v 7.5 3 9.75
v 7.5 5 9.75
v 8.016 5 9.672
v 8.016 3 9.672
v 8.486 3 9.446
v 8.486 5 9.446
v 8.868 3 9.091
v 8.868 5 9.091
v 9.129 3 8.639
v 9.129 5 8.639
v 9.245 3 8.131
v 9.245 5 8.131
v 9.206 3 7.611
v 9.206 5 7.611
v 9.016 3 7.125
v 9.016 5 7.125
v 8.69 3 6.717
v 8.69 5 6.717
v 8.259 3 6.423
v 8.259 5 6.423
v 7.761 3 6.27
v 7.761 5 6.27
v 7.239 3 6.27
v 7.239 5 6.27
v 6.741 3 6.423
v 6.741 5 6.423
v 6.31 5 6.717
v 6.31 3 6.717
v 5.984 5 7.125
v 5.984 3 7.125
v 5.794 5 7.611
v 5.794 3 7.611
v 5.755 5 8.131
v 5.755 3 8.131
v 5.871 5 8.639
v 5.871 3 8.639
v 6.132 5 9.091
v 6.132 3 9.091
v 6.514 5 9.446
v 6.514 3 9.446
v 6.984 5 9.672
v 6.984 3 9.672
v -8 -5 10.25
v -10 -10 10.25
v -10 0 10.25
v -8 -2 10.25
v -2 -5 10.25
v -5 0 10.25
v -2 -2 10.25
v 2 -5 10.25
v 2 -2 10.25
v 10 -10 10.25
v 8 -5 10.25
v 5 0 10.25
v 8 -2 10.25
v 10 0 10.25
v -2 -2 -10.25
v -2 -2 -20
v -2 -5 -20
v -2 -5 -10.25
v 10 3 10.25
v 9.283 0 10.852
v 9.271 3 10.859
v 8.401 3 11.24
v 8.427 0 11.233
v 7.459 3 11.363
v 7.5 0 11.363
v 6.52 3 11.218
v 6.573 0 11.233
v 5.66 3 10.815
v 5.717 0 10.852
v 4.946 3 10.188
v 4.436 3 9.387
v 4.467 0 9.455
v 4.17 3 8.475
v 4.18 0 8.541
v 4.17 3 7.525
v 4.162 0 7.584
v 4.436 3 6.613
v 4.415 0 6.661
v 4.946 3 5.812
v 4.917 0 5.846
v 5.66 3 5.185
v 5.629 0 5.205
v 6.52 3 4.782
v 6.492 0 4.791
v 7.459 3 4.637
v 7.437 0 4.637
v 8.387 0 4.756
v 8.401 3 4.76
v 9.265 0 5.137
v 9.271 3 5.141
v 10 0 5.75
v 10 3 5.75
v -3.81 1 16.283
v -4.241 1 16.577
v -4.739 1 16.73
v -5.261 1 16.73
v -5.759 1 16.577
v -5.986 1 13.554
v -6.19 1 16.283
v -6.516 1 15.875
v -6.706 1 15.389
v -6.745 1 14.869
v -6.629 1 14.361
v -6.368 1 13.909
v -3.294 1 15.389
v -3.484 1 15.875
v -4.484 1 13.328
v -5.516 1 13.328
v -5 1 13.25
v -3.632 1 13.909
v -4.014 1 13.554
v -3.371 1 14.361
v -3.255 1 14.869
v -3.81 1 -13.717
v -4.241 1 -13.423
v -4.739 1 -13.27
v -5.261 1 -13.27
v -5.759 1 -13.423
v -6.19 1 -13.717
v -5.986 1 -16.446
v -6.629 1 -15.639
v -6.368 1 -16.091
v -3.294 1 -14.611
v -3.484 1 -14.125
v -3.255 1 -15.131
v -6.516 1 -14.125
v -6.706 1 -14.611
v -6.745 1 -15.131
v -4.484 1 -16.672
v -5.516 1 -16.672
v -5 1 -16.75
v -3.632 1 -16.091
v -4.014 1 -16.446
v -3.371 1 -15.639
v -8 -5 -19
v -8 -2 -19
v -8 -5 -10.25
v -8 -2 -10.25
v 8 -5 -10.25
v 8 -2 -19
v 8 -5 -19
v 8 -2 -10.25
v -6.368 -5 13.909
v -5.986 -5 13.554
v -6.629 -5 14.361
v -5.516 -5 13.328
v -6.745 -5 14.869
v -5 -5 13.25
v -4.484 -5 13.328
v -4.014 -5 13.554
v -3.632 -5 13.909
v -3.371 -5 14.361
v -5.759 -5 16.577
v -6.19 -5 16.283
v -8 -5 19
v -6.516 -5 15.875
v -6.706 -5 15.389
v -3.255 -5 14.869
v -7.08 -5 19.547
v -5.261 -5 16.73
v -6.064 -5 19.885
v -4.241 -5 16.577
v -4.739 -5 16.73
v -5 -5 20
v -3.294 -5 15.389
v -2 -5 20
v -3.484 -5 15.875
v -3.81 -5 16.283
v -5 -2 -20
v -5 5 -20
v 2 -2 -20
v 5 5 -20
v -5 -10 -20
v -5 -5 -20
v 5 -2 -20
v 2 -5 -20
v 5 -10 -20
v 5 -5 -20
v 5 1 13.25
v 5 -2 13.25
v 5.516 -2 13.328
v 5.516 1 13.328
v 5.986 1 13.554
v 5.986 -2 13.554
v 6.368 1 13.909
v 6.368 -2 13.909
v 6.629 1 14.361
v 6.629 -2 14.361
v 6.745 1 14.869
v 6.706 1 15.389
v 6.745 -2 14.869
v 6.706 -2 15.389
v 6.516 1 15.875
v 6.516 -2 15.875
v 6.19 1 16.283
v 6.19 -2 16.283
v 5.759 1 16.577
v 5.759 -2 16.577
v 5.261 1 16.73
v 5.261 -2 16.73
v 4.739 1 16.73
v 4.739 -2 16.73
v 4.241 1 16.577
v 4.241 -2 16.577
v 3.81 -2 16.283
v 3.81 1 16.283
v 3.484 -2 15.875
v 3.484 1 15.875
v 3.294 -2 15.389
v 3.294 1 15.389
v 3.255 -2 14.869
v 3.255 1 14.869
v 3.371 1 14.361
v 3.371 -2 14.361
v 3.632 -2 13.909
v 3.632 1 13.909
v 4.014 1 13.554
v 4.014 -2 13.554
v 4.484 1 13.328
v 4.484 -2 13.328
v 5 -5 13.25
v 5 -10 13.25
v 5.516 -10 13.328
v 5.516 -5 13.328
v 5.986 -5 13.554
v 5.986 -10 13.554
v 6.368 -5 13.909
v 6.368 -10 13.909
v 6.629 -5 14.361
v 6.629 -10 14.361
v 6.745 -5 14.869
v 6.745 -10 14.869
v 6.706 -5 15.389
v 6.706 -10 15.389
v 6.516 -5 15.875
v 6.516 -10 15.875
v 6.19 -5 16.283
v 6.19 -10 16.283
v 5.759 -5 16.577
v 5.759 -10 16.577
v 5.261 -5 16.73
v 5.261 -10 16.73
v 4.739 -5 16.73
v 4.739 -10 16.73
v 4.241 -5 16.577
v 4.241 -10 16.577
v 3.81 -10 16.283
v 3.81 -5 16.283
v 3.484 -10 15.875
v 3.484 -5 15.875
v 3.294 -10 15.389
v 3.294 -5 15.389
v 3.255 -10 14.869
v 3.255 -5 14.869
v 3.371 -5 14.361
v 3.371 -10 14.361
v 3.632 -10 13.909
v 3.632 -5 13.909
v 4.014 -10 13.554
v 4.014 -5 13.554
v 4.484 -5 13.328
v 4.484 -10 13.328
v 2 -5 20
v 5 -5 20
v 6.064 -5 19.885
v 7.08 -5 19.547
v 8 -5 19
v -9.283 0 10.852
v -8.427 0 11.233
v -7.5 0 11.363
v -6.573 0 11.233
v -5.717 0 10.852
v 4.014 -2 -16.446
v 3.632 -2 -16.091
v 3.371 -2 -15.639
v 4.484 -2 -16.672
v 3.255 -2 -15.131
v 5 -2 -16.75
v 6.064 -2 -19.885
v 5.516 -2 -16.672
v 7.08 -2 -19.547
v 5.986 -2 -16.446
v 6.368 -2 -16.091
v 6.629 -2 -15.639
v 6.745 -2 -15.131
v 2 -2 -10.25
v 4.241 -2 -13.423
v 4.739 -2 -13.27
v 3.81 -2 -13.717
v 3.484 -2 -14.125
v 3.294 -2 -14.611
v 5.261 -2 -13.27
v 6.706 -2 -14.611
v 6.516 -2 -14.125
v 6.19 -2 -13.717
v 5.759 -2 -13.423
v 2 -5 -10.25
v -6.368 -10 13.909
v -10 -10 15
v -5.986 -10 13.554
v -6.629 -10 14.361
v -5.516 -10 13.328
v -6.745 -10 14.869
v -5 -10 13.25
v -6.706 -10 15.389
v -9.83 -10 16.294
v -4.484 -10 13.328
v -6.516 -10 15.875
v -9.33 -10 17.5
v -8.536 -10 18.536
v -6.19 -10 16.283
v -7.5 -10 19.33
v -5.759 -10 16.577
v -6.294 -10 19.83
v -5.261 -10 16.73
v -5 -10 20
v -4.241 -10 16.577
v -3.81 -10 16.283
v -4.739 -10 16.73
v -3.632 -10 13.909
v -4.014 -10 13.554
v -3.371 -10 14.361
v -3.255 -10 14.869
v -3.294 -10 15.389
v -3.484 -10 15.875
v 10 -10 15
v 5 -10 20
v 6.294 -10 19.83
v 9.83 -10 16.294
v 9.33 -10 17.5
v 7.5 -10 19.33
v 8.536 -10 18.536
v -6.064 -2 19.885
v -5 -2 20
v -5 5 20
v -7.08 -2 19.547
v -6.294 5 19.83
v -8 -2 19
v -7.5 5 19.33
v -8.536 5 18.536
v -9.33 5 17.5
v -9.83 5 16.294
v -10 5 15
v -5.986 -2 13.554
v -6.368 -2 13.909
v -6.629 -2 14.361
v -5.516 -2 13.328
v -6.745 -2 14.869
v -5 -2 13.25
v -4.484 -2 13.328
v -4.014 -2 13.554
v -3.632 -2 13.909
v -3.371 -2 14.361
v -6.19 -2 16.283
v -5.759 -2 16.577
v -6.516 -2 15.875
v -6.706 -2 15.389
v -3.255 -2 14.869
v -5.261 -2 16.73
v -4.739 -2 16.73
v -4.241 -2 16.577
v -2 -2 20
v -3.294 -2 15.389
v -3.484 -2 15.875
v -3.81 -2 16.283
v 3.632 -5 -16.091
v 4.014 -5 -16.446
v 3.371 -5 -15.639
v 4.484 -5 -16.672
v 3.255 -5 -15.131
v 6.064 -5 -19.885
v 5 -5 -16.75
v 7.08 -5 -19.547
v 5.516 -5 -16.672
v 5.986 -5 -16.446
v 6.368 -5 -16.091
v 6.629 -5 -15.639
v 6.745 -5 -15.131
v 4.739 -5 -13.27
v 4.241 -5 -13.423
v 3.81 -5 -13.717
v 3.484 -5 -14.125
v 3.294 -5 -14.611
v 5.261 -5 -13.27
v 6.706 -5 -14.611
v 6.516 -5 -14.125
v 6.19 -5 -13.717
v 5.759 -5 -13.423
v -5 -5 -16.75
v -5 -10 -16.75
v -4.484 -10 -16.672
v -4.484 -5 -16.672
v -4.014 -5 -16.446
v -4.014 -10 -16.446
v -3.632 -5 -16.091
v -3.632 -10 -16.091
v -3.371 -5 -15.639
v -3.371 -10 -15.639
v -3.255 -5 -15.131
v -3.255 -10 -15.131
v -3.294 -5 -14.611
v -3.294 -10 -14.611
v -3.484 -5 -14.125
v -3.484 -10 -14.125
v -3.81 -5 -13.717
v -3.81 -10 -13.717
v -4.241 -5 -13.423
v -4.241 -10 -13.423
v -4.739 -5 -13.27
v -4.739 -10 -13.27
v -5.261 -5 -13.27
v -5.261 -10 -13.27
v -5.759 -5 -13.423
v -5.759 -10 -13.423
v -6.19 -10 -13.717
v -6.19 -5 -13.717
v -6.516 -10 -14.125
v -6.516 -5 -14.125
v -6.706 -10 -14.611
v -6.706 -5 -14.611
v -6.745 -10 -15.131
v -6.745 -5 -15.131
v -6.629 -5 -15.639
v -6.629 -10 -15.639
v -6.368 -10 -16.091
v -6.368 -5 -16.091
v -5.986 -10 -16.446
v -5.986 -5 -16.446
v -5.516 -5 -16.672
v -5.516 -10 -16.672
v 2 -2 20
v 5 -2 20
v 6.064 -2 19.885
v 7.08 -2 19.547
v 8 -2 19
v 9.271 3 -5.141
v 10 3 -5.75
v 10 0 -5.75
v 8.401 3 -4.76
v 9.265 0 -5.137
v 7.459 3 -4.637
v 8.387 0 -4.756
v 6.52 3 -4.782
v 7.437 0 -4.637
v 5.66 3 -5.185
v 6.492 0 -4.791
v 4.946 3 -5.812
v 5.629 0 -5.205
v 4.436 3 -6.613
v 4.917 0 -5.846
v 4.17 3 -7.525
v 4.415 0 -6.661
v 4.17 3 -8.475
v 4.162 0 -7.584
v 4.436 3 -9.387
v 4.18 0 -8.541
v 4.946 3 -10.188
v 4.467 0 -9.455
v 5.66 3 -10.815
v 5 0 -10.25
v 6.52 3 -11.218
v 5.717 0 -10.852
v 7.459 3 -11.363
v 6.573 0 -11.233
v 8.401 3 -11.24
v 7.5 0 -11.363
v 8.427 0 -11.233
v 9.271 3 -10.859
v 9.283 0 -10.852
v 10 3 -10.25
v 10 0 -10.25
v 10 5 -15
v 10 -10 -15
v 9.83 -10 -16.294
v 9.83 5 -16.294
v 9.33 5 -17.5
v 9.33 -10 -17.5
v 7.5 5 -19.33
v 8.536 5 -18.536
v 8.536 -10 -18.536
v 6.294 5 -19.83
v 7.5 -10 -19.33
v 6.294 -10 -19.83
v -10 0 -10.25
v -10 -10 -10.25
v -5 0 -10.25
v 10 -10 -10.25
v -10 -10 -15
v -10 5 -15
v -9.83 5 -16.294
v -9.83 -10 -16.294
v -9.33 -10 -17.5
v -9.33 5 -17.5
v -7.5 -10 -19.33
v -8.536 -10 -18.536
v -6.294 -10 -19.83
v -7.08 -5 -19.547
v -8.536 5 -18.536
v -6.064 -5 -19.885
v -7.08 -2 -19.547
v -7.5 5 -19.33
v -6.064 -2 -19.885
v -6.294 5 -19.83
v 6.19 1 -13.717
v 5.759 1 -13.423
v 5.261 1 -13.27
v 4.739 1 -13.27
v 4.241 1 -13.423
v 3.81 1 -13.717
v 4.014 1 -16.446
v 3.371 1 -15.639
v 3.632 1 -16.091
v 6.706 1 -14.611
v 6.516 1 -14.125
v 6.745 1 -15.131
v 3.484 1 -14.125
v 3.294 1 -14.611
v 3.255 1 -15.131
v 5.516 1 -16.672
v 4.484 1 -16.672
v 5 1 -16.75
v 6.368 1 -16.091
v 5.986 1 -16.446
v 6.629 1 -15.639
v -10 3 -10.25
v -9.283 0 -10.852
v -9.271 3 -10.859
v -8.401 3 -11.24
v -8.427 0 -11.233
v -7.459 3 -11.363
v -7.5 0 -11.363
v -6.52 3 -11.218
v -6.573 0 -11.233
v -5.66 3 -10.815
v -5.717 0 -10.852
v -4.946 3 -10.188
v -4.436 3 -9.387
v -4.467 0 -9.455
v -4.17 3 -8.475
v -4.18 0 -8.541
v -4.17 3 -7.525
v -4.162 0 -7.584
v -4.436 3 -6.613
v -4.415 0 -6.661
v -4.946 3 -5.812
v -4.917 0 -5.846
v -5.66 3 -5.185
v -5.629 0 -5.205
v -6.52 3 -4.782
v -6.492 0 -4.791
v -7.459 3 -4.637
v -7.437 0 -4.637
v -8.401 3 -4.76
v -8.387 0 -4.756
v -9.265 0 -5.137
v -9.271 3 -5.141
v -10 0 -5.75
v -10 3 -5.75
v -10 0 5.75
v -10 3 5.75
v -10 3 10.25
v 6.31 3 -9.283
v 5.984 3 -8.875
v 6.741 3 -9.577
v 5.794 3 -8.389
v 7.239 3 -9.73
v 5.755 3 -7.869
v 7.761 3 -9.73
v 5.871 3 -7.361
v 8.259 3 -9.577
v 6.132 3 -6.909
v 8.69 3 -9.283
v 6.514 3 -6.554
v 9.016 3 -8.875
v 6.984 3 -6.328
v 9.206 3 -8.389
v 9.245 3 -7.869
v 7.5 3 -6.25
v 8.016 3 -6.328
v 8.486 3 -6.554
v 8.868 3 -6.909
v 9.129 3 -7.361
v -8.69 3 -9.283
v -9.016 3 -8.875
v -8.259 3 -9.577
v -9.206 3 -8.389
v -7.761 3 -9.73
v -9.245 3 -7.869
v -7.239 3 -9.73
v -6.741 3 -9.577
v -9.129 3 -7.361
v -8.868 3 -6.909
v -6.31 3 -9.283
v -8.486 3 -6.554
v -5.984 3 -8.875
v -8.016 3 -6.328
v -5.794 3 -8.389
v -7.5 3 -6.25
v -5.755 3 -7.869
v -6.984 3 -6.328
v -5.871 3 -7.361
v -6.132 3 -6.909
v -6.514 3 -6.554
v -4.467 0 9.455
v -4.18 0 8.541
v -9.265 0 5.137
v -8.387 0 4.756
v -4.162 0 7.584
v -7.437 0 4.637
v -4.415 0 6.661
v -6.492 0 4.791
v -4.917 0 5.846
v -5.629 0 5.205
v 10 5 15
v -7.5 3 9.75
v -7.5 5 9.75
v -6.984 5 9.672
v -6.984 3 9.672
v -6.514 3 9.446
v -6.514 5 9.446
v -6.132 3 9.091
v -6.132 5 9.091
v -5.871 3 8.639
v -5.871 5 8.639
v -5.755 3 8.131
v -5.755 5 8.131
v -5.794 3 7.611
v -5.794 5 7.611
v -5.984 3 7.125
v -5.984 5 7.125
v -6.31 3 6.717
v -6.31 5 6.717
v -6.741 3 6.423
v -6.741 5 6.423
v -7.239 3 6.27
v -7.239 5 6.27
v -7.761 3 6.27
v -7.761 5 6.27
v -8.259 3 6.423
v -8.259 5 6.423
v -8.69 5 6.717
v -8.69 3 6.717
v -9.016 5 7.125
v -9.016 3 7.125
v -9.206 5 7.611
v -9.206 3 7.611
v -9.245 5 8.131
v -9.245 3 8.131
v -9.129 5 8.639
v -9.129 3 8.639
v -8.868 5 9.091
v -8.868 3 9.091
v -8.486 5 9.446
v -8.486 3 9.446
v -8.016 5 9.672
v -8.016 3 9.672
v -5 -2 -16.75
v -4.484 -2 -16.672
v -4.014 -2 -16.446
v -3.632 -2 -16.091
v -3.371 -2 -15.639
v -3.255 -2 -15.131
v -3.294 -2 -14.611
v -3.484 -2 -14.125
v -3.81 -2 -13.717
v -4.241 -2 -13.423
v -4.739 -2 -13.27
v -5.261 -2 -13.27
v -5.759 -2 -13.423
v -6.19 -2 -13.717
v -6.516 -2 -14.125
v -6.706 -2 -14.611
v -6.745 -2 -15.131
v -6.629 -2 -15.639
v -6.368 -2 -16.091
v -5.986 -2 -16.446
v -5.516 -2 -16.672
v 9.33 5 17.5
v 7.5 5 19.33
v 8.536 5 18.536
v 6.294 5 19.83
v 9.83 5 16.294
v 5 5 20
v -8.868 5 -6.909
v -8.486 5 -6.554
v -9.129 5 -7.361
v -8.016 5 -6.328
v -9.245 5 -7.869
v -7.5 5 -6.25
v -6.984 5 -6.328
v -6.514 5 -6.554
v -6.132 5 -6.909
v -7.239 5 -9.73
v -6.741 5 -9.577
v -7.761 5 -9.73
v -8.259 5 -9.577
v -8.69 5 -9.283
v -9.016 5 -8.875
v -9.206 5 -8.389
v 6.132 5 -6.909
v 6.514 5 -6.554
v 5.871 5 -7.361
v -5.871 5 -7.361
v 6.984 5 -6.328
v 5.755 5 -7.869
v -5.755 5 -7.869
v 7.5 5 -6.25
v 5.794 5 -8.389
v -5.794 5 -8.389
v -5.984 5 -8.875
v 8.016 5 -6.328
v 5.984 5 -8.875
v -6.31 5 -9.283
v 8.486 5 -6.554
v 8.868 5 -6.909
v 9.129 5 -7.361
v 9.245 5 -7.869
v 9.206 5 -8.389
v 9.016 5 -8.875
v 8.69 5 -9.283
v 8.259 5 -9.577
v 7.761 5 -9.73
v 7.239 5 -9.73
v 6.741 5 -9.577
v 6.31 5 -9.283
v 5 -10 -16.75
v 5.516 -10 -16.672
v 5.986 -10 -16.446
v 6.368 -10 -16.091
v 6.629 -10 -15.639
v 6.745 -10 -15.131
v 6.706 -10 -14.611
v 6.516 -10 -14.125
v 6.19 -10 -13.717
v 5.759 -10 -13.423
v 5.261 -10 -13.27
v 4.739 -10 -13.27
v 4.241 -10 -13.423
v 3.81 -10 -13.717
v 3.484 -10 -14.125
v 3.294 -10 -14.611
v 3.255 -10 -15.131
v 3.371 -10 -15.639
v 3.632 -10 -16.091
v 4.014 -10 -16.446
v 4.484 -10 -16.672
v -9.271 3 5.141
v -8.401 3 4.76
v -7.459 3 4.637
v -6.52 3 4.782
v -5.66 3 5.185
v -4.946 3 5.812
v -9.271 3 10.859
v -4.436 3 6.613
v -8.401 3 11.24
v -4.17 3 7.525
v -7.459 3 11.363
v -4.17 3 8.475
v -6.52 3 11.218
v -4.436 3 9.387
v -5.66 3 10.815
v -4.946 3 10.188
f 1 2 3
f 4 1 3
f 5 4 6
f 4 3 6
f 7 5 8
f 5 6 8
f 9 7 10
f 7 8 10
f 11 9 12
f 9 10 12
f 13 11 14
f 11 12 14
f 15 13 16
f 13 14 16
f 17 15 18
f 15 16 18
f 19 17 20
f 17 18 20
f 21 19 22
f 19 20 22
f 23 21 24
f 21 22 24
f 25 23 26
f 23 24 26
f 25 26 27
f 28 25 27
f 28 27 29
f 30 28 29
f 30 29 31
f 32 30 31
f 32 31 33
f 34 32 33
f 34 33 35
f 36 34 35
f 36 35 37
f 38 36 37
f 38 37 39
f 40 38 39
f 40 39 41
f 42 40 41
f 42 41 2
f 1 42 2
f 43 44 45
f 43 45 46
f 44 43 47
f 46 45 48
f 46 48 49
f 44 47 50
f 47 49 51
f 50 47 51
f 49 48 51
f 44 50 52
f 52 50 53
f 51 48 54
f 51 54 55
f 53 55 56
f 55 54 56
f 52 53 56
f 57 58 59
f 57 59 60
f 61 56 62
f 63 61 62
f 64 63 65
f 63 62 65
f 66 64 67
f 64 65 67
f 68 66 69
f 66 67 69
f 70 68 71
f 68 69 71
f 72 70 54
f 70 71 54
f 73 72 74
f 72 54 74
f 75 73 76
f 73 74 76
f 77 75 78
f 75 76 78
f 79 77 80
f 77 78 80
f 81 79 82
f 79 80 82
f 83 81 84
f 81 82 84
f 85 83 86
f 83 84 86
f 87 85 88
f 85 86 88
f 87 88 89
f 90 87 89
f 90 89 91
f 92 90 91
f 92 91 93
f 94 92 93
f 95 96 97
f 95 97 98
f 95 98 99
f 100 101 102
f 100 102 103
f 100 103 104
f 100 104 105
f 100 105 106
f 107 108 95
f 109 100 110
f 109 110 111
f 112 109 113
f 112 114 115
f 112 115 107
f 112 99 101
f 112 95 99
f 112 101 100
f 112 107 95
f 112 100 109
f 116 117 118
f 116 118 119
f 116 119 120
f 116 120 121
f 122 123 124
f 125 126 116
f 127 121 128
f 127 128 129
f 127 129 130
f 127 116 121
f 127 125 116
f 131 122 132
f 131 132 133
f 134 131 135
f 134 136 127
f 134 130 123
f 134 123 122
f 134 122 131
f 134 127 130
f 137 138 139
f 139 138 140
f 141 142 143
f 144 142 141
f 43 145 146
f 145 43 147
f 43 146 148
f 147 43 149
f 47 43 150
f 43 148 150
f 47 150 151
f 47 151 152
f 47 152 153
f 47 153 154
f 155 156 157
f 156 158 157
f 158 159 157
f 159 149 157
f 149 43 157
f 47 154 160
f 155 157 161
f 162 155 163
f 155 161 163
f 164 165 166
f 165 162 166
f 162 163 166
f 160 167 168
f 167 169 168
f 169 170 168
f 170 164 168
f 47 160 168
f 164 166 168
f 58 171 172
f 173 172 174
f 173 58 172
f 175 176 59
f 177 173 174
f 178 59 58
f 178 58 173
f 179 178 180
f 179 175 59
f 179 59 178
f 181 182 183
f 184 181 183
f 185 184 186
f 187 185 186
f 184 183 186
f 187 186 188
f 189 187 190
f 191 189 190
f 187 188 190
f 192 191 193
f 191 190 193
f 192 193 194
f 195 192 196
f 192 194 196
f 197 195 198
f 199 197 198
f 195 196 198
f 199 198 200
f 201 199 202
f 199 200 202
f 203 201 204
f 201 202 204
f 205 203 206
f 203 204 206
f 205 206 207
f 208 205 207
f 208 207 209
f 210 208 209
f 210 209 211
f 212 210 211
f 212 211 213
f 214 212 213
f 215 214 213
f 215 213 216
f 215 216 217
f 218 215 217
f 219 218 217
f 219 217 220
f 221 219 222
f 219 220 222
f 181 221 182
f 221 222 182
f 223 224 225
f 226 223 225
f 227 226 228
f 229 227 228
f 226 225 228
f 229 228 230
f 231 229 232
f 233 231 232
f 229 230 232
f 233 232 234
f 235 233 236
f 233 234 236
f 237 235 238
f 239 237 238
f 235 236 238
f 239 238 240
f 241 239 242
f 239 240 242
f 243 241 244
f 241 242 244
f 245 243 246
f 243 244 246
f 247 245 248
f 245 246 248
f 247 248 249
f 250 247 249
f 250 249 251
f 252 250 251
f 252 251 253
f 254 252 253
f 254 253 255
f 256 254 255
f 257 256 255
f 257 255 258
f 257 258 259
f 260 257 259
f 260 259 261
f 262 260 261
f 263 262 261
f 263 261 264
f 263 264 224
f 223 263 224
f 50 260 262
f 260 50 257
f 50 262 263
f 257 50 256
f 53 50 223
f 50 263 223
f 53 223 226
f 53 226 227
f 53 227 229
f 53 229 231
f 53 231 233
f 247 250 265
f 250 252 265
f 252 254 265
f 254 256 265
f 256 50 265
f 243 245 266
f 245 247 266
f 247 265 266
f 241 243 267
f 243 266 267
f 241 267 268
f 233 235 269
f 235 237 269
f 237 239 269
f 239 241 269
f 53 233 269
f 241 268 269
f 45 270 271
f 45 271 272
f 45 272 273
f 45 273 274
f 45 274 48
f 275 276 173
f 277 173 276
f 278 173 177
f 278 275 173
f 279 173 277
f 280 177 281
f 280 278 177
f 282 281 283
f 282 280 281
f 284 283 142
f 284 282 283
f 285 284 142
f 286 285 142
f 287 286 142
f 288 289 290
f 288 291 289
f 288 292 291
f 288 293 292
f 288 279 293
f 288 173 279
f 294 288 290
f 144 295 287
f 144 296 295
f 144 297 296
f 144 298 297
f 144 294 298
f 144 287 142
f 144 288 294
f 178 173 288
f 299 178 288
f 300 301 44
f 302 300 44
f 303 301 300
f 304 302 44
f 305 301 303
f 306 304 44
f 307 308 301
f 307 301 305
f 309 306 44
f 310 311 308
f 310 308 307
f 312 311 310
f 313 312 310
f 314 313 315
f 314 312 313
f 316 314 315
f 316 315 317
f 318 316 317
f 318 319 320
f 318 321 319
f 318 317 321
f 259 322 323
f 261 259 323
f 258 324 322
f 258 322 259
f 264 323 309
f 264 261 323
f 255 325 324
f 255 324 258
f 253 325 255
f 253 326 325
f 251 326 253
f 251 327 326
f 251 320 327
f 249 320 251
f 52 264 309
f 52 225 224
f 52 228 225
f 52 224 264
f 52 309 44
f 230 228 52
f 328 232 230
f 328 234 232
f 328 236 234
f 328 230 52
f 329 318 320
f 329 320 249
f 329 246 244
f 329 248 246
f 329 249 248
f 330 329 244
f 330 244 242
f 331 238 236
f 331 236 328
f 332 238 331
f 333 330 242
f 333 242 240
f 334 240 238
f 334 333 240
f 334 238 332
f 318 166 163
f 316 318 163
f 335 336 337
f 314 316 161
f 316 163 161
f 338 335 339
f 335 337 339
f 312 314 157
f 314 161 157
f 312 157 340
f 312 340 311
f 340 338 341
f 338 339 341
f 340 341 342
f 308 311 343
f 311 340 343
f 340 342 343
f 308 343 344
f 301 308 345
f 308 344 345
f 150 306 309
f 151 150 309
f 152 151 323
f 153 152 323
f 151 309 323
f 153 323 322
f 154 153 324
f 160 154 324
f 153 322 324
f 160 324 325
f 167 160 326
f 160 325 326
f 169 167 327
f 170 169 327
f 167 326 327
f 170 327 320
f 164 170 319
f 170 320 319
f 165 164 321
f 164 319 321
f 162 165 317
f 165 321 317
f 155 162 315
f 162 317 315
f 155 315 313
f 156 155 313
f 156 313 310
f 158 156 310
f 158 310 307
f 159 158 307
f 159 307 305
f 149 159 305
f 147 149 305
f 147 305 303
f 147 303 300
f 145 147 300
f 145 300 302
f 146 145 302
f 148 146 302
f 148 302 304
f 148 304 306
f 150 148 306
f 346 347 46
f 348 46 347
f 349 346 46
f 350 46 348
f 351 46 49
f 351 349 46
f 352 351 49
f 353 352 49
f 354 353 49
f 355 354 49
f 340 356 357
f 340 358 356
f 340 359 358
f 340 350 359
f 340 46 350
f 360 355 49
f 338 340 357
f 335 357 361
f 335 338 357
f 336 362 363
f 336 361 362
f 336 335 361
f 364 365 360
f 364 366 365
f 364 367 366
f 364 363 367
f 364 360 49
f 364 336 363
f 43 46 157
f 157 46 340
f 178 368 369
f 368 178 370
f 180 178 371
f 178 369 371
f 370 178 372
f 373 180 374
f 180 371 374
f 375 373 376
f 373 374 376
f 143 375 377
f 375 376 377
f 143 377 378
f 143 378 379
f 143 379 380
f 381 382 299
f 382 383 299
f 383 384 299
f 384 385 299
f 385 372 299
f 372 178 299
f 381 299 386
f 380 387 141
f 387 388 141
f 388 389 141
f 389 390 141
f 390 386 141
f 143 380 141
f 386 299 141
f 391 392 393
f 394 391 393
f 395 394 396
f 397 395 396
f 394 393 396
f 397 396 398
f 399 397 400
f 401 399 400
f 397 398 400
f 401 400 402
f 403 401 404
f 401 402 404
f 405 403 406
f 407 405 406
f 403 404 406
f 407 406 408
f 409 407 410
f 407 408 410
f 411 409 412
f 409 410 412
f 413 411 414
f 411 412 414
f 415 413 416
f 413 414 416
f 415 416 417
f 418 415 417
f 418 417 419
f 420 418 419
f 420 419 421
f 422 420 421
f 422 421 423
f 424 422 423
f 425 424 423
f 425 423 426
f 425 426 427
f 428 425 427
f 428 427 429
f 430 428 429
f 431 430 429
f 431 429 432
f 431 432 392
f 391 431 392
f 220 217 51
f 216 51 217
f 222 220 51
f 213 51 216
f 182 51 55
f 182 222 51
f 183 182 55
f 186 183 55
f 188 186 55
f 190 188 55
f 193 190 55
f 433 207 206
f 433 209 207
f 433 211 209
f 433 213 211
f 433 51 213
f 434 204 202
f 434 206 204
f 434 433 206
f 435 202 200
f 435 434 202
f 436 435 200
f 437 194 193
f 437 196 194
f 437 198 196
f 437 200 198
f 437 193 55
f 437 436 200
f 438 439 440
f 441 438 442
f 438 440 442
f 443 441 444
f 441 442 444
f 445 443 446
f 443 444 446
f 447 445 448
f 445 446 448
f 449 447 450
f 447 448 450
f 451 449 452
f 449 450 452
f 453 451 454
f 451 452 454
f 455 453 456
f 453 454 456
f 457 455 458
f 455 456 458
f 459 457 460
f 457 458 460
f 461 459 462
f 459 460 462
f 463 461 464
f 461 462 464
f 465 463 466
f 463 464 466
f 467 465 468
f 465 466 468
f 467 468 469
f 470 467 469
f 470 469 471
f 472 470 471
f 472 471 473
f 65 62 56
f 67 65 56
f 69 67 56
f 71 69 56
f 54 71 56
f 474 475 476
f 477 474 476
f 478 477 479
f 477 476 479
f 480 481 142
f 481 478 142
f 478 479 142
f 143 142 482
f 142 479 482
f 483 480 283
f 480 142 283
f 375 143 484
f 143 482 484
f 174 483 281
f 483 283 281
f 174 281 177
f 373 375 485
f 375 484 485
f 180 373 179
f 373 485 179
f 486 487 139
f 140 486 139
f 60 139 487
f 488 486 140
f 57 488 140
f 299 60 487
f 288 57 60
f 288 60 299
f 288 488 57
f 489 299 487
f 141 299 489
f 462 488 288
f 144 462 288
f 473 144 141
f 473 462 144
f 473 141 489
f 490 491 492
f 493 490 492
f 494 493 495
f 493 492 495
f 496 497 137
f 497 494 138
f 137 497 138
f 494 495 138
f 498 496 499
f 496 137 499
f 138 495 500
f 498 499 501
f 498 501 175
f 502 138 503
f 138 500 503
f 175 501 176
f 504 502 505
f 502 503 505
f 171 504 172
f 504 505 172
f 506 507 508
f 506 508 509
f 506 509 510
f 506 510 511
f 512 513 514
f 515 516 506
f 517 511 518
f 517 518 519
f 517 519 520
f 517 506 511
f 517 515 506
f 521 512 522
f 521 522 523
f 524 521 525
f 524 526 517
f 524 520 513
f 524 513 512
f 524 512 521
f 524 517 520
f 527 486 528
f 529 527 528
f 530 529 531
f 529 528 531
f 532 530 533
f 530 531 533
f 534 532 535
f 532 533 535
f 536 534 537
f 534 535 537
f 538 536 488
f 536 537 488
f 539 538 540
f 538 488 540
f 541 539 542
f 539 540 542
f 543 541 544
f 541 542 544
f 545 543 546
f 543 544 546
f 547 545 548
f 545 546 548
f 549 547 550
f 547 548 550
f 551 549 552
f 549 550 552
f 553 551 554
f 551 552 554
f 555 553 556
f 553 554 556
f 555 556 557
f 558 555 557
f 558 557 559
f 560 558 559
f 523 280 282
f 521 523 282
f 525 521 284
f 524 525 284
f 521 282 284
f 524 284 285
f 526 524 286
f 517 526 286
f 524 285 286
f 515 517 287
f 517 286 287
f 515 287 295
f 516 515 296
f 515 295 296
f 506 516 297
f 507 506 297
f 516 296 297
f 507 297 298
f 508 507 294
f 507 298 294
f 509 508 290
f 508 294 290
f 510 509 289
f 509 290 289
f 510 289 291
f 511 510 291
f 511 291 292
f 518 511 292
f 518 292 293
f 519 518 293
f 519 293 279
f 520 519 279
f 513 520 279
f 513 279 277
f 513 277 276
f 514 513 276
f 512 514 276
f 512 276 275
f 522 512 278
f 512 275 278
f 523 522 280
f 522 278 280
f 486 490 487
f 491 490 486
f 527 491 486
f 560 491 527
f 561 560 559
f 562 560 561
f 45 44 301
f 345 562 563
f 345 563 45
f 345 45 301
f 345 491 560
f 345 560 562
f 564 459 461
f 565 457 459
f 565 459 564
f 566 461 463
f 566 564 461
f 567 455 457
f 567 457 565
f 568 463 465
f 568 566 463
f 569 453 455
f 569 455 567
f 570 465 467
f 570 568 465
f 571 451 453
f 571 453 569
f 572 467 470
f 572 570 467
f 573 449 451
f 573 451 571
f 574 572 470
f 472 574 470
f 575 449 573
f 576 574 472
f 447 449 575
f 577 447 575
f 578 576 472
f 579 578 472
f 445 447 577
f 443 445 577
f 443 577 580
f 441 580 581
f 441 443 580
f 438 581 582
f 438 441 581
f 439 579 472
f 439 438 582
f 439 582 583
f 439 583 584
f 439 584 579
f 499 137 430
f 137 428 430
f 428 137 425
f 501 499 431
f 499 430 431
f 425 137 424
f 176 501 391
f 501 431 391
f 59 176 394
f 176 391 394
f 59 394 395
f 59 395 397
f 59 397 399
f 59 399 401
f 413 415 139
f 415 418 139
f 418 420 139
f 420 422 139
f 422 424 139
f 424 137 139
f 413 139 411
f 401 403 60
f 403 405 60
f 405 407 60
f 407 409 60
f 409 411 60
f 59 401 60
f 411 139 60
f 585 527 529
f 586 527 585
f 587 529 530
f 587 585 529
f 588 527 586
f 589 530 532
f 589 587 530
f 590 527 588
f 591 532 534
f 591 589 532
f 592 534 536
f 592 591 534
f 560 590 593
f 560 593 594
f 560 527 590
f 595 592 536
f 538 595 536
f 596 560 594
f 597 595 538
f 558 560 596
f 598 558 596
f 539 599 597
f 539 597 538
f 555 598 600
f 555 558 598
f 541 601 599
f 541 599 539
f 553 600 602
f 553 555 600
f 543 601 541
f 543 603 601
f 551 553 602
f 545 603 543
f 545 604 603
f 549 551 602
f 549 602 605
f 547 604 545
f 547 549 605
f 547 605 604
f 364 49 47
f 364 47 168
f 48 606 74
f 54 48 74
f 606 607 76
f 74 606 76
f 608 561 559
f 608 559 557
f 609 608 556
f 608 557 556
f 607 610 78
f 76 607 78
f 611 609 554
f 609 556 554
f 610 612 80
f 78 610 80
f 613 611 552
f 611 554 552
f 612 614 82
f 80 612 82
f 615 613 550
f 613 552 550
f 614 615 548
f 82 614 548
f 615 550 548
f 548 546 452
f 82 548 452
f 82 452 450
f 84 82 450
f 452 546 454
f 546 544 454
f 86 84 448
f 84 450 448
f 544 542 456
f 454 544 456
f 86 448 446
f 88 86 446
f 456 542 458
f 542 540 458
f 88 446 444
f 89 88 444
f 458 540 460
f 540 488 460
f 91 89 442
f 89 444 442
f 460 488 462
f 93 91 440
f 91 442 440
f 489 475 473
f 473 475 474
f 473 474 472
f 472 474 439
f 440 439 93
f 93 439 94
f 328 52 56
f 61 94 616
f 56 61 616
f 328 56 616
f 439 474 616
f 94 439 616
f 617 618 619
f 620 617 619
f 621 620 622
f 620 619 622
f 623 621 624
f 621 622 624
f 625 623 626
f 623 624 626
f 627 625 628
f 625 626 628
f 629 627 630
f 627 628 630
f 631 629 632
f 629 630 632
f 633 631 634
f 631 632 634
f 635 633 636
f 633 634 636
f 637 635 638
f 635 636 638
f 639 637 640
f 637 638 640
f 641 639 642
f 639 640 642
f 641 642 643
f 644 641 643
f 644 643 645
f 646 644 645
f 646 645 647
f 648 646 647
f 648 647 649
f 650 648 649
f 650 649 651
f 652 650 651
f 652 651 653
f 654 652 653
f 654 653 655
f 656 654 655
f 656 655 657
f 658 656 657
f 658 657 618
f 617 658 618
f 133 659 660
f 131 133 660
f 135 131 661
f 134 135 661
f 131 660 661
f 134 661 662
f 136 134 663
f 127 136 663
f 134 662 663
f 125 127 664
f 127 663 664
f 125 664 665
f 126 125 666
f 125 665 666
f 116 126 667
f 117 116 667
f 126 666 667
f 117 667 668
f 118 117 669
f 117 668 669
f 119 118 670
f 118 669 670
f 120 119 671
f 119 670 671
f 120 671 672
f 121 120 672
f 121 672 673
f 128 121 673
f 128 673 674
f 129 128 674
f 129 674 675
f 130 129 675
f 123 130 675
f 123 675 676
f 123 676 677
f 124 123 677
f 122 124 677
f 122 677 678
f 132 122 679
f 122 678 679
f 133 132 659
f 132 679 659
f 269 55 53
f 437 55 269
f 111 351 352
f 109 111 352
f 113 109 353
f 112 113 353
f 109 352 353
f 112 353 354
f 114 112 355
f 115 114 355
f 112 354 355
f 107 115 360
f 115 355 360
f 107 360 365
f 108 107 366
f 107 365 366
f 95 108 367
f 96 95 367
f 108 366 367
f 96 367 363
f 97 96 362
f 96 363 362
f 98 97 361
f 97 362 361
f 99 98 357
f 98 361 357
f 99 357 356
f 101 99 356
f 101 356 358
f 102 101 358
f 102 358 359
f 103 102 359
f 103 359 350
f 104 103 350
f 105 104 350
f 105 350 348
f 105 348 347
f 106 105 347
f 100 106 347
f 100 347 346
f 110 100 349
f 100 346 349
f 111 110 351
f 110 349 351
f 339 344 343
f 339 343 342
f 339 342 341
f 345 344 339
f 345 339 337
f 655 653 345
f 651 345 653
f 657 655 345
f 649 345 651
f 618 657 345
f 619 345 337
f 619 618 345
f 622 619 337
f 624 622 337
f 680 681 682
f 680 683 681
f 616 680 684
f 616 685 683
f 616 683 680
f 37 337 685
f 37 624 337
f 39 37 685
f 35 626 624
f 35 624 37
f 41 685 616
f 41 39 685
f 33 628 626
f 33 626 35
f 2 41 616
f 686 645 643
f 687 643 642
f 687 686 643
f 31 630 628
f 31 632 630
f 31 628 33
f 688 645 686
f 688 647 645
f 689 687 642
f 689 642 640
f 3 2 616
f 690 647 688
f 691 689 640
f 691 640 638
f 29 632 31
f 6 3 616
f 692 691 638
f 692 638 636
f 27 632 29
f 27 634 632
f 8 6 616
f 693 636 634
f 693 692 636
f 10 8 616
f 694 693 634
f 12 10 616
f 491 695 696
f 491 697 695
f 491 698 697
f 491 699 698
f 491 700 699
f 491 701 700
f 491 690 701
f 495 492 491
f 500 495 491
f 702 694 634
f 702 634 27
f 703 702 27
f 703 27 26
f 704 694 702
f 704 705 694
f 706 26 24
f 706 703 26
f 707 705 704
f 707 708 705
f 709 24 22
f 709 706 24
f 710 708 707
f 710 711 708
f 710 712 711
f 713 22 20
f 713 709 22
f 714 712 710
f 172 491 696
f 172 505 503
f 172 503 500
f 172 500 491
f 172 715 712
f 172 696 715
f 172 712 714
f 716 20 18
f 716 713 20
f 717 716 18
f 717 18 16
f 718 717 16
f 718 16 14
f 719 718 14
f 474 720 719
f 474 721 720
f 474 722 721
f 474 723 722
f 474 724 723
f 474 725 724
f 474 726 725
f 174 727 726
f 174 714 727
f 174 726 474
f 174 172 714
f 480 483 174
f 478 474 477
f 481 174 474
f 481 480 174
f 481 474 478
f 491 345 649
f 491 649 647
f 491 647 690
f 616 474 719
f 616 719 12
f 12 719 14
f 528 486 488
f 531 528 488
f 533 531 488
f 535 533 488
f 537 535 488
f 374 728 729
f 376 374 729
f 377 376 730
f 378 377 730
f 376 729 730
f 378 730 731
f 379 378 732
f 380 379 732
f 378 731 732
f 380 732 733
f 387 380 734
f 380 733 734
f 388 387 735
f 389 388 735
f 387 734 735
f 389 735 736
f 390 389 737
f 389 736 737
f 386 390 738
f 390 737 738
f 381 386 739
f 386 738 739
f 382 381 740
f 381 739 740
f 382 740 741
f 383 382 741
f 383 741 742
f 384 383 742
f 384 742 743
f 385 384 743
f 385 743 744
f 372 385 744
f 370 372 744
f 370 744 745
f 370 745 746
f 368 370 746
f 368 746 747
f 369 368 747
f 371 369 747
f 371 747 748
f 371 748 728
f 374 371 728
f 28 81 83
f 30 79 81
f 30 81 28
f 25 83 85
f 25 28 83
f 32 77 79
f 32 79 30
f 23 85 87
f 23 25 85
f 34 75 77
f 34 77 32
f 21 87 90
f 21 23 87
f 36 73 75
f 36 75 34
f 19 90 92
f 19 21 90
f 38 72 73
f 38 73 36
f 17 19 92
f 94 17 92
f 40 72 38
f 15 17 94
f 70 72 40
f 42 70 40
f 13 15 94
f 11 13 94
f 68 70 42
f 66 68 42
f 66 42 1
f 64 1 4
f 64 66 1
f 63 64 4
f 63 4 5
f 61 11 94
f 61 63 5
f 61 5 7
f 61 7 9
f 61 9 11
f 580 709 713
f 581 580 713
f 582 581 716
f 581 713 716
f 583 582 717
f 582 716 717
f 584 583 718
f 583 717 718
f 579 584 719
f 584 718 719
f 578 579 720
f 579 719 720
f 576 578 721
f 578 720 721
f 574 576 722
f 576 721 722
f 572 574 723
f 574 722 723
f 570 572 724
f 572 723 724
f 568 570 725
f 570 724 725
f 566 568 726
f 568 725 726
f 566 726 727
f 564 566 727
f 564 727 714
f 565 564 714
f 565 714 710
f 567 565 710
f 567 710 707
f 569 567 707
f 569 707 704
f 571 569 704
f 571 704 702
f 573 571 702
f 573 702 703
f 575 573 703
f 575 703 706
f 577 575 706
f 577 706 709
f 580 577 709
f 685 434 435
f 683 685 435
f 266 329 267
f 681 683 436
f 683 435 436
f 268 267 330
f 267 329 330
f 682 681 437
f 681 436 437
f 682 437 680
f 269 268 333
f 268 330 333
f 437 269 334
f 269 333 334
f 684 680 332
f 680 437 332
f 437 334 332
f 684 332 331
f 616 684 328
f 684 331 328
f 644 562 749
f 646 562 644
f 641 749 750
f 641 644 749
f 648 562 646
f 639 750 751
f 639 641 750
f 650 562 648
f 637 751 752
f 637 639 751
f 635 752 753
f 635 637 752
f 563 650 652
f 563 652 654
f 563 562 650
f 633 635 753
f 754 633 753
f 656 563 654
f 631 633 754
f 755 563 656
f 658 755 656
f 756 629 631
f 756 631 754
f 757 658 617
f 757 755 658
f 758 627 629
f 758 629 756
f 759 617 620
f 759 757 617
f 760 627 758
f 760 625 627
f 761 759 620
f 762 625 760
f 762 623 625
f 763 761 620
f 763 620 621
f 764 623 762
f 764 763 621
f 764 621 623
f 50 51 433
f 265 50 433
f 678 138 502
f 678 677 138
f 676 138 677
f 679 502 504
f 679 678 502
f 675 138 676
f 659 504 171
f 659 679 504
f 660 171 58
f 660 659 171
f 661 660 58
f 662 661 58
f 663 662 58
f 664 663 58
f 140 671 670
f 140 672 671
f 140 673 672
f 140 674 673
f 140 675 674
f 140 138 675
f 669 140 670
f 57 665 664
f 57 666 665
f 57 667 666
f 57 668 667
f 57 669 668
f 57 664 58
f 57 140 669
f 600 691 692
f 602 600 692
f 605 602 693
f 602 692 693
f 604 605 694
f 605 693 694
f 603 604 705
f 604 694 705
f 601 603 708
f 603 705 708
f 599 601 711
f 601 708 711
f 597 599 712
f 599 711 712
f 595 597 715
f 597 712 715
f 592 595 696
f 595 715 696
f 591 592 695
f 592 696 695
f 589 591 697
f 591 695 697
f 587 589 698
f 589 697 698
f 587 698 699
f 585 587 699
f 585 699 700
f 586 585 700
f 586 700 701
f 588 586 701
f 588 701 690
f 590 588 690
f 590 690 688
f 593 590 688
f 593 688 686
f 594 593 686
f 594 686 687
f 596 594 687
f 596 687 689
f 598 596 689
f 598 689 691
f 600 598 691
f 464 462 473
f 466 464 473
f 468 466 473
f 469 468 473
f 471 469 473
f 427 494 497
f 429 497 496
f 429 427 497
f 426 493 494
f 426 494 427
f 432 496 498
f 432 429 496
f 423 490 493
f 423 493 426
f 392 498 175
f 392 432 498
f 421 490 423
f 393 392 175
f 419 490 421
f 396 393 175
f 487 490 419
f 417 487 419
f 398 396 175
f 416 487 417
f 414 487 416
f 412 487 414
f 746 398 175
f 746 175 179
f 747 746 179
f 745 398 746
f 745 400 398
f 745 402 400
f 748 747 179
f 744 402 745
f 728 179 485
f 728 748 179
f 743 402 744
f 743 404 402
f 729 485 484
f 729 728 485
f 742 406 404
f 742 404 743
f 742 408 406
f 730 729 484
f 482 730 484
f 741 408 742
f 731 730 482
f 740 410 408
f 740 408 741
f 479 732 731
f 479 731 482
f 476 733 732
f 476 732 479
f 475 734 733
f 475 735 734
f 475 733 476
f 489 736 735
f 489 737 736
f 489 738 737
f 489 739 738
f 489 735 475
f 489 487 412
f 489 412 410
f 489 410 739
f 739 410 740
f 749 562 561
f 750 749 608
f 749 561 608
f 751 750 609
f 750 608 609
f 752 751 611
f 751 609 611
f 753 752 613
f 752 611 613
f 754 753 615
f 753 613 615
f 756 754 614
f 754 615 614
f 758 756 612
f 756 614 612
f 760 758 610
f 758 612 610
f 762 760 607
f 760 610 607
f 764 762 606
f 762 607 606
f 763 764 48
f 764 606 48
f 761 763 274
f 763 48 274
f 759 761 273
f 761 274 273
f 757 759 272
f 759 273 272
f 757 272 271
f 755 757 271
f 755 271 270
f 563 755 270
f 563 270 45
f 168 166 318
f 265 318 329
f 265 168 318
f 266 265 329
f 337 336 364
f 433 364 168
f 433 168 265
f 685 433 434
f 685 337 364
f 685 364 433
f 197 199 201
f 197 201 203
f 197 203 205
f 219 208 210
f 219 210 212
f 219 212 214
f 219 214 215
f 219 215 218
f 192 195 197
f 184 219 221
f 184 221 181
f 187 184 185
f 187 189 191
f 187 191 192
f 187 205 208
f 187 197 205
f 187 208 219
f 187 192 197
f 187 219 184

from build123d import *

# Parameters (mm, degrees)
SKETCH1_W           = 20
SKETCH1_H           = 40
BOSS_EXTRUDE1_DEPTH = 5
SKETCH2_W           = 20
SKETCH2_H           = 9.75
BOSS_EXTRUDE2_DEPTH = 10
SKETCH3_R           = 1.75
CUT_EXTRUDE1_DEPTH  = 5
SKETCH4_R           = 3.363406012
CUT_EXTRUDE2_DEPTH  = 3
SKETCH5_R           = 1.75
CUT_EXTRUDE3_DEPTH  = 8
SKETCH6_W           = 6
SKETCH6_H           = 10
CUT_EXTRUDE4_DEPTH  = 3
SKETCH7_R           = 1.75
CUT_EXTRUDE5_DEPTH  = 3
FILLET1_R           = 5


with BuildPart() as part:
    # Sketch1 → Boss-Extrude1 (new body)
    with BuildSketch(Plane(origin=(0, 0, 0), x_dir=(1, 0, 0), z_dir=(0, 1, 0))):
        Rectangle(SKETCH1_W, SKETCH1_H)
    extrude(amount=BOSS_EXTRUDE1_DEPTH)

    # Sketch2 → Boss-Extrude2 (add)
    with BuildSketch(Plane.XZ):
        with Locations((0, 15.125)):
            Rectangle(SKETCH2_W, SKETCH2_H)
        with Locations((0, -15.125)):
            Rectangle(SKETCH2_W, SKETCH2_H)
    extrude(amount=BOSS_EXTRUDE2_DEPTH)

    # Sketch3 → Cut-Extrude1 (cut)
    with BuildSketch(Plane(origin=(0, 5, 0), x_dir=(1, 0, 0), z_dir=(0, 1, 0))):
        with Locations(Location((-7.5, -8, 0), (0, 0, 270))):
            Circle(SKETCH3_R)
        with Locations(Location((-7.5, 8, 0), (0, 0, 270))):
            Circle(SKETCH3_R)
        with Locations(Location((7.5, -8, 0), (0, 0, 270))):
            Circle(SKETCH3_R)
        with Locations(Location((7.5, 8, 0), (0, 0, 270))):
            Circle(SKETCH3_R)
    extrude(amount=-CUT_EXTRUDE1_DEPTH, mode=Mode.SUBTRACT)

    # Sketch4 → Cut-Extrude2 (cut)
    with BuildSketch(Plane.XZ):
        with Locations((7.5, 8)):
            Circle(SKETCH4_R)
        with Locations((-7.5, 8)):
            Circle(SKETCH4_R)
        with Locations((-7.5, -8)):
            Circle(SKETCH4_R)
        with Locations((7.5, -8)):
            Circle(SKETCH4_R)
    extrude(amount=-CUT_EXTRUDE2_DEPTH, mode=Mode.SUBTRACT)

    # Sketch5 → Cut-Extrude3 (cut)
    with BuildSketch(Plane.XZ.offset(10)):
        with Locations(Location((-5, -15, 0), (0, 0, 270))):
            Circle(SKETCH5_R)
        with Locations(Location((5, -15, 0), (0, 0, 270))):
            Circle(SKETCH5_R)
        with Locations(Location((-5, 15, 0), (0, 0, 270))):
            Circle(SKETCH5_R)
        with Locations(Location((5, 15, 0), (0, 0, 270))):
            Circle(SKETCH5_R)
    extrude(amount=-CUT_EXTRUDE3_DEPTH, mode=Mode.SUBTRACT)

    # Sketch6 → Cut-Extrude4 (cut)
    with BuildSketch(Plane.XZ.offset(2)):
        with Locations((-5, -15)):
            Rectangle(SKETCH6_W, SKETCH6_H)
        with Locations((5, -15)):
            Rectangle(SKETCH6_W, SKETCH6_H)
        with Locations((5, 15)):
            Rectangle(SKETCH6_W, SKETCH6_H)
        with Locations((-5, 15)):
            Rectangle(SKETCH6_W, SKETCH6_H)
    extrude(amount=CUT_EXTRUDE4_DEPTH, mode=Mode.SUBTRACT)

    # Sketch7 → Cut-Extrude5 (cut)
    with BuildSketch(Plane.XZ.offset(2)):
        with Locations(Location((-5, -15, 0), (0, 0, 270))):
            Circle(SKETCH7_R)
        with Locations(Location((5, -15, 0), (0, 0, 270))):
            Circle(SKETCH7_R)
        with Locations(Location((5, 15, 0), (0, 0, 270))):
            Circle(SKETCH7_R)
        with Locations(Location((-5, 15, 0), (0, 0, 270))):
            Circle(SKETCH7_R)
    extrude(amount=-CUT_EXTRUDE5_DEPTH, mode=Mode.SUBTRACT)

    # Fillet1
    # the kernel refuses this fillet: 5 mm, written as the material it takes off along each edge
    with BuildSketch(Plane(origin=(-10, 17.5, -20), x_dir=(0, 0, 1), z_dir=(0, -1, 0)), Plane(origin=(10, -22.5, -20), x_dir=(0, 0, 1), z_dir=(0, 1, 0)), Plane(origin=(-10, 17.5, 20), x_dir=(1, 0, 0), z_dir=(0, -1, 0)), Plane(origin=(10, -22.5, 20), x_dir=(-1, 0, 0), z_dir=(0, 1, 0))) as fillet1_piece_1:
        with BuildLine():
            CenterArc((FILLET1_R, -FILLET1_R), FILLET1_R, 90, 90)
            Line((0, -FILLET1_R), (0, 0))
            Line((0, 0), (FILLET1_R, 0))
        make_face()
    extrude(amount=40, mode=Mode.SUBTRACT)


solid = part.part
